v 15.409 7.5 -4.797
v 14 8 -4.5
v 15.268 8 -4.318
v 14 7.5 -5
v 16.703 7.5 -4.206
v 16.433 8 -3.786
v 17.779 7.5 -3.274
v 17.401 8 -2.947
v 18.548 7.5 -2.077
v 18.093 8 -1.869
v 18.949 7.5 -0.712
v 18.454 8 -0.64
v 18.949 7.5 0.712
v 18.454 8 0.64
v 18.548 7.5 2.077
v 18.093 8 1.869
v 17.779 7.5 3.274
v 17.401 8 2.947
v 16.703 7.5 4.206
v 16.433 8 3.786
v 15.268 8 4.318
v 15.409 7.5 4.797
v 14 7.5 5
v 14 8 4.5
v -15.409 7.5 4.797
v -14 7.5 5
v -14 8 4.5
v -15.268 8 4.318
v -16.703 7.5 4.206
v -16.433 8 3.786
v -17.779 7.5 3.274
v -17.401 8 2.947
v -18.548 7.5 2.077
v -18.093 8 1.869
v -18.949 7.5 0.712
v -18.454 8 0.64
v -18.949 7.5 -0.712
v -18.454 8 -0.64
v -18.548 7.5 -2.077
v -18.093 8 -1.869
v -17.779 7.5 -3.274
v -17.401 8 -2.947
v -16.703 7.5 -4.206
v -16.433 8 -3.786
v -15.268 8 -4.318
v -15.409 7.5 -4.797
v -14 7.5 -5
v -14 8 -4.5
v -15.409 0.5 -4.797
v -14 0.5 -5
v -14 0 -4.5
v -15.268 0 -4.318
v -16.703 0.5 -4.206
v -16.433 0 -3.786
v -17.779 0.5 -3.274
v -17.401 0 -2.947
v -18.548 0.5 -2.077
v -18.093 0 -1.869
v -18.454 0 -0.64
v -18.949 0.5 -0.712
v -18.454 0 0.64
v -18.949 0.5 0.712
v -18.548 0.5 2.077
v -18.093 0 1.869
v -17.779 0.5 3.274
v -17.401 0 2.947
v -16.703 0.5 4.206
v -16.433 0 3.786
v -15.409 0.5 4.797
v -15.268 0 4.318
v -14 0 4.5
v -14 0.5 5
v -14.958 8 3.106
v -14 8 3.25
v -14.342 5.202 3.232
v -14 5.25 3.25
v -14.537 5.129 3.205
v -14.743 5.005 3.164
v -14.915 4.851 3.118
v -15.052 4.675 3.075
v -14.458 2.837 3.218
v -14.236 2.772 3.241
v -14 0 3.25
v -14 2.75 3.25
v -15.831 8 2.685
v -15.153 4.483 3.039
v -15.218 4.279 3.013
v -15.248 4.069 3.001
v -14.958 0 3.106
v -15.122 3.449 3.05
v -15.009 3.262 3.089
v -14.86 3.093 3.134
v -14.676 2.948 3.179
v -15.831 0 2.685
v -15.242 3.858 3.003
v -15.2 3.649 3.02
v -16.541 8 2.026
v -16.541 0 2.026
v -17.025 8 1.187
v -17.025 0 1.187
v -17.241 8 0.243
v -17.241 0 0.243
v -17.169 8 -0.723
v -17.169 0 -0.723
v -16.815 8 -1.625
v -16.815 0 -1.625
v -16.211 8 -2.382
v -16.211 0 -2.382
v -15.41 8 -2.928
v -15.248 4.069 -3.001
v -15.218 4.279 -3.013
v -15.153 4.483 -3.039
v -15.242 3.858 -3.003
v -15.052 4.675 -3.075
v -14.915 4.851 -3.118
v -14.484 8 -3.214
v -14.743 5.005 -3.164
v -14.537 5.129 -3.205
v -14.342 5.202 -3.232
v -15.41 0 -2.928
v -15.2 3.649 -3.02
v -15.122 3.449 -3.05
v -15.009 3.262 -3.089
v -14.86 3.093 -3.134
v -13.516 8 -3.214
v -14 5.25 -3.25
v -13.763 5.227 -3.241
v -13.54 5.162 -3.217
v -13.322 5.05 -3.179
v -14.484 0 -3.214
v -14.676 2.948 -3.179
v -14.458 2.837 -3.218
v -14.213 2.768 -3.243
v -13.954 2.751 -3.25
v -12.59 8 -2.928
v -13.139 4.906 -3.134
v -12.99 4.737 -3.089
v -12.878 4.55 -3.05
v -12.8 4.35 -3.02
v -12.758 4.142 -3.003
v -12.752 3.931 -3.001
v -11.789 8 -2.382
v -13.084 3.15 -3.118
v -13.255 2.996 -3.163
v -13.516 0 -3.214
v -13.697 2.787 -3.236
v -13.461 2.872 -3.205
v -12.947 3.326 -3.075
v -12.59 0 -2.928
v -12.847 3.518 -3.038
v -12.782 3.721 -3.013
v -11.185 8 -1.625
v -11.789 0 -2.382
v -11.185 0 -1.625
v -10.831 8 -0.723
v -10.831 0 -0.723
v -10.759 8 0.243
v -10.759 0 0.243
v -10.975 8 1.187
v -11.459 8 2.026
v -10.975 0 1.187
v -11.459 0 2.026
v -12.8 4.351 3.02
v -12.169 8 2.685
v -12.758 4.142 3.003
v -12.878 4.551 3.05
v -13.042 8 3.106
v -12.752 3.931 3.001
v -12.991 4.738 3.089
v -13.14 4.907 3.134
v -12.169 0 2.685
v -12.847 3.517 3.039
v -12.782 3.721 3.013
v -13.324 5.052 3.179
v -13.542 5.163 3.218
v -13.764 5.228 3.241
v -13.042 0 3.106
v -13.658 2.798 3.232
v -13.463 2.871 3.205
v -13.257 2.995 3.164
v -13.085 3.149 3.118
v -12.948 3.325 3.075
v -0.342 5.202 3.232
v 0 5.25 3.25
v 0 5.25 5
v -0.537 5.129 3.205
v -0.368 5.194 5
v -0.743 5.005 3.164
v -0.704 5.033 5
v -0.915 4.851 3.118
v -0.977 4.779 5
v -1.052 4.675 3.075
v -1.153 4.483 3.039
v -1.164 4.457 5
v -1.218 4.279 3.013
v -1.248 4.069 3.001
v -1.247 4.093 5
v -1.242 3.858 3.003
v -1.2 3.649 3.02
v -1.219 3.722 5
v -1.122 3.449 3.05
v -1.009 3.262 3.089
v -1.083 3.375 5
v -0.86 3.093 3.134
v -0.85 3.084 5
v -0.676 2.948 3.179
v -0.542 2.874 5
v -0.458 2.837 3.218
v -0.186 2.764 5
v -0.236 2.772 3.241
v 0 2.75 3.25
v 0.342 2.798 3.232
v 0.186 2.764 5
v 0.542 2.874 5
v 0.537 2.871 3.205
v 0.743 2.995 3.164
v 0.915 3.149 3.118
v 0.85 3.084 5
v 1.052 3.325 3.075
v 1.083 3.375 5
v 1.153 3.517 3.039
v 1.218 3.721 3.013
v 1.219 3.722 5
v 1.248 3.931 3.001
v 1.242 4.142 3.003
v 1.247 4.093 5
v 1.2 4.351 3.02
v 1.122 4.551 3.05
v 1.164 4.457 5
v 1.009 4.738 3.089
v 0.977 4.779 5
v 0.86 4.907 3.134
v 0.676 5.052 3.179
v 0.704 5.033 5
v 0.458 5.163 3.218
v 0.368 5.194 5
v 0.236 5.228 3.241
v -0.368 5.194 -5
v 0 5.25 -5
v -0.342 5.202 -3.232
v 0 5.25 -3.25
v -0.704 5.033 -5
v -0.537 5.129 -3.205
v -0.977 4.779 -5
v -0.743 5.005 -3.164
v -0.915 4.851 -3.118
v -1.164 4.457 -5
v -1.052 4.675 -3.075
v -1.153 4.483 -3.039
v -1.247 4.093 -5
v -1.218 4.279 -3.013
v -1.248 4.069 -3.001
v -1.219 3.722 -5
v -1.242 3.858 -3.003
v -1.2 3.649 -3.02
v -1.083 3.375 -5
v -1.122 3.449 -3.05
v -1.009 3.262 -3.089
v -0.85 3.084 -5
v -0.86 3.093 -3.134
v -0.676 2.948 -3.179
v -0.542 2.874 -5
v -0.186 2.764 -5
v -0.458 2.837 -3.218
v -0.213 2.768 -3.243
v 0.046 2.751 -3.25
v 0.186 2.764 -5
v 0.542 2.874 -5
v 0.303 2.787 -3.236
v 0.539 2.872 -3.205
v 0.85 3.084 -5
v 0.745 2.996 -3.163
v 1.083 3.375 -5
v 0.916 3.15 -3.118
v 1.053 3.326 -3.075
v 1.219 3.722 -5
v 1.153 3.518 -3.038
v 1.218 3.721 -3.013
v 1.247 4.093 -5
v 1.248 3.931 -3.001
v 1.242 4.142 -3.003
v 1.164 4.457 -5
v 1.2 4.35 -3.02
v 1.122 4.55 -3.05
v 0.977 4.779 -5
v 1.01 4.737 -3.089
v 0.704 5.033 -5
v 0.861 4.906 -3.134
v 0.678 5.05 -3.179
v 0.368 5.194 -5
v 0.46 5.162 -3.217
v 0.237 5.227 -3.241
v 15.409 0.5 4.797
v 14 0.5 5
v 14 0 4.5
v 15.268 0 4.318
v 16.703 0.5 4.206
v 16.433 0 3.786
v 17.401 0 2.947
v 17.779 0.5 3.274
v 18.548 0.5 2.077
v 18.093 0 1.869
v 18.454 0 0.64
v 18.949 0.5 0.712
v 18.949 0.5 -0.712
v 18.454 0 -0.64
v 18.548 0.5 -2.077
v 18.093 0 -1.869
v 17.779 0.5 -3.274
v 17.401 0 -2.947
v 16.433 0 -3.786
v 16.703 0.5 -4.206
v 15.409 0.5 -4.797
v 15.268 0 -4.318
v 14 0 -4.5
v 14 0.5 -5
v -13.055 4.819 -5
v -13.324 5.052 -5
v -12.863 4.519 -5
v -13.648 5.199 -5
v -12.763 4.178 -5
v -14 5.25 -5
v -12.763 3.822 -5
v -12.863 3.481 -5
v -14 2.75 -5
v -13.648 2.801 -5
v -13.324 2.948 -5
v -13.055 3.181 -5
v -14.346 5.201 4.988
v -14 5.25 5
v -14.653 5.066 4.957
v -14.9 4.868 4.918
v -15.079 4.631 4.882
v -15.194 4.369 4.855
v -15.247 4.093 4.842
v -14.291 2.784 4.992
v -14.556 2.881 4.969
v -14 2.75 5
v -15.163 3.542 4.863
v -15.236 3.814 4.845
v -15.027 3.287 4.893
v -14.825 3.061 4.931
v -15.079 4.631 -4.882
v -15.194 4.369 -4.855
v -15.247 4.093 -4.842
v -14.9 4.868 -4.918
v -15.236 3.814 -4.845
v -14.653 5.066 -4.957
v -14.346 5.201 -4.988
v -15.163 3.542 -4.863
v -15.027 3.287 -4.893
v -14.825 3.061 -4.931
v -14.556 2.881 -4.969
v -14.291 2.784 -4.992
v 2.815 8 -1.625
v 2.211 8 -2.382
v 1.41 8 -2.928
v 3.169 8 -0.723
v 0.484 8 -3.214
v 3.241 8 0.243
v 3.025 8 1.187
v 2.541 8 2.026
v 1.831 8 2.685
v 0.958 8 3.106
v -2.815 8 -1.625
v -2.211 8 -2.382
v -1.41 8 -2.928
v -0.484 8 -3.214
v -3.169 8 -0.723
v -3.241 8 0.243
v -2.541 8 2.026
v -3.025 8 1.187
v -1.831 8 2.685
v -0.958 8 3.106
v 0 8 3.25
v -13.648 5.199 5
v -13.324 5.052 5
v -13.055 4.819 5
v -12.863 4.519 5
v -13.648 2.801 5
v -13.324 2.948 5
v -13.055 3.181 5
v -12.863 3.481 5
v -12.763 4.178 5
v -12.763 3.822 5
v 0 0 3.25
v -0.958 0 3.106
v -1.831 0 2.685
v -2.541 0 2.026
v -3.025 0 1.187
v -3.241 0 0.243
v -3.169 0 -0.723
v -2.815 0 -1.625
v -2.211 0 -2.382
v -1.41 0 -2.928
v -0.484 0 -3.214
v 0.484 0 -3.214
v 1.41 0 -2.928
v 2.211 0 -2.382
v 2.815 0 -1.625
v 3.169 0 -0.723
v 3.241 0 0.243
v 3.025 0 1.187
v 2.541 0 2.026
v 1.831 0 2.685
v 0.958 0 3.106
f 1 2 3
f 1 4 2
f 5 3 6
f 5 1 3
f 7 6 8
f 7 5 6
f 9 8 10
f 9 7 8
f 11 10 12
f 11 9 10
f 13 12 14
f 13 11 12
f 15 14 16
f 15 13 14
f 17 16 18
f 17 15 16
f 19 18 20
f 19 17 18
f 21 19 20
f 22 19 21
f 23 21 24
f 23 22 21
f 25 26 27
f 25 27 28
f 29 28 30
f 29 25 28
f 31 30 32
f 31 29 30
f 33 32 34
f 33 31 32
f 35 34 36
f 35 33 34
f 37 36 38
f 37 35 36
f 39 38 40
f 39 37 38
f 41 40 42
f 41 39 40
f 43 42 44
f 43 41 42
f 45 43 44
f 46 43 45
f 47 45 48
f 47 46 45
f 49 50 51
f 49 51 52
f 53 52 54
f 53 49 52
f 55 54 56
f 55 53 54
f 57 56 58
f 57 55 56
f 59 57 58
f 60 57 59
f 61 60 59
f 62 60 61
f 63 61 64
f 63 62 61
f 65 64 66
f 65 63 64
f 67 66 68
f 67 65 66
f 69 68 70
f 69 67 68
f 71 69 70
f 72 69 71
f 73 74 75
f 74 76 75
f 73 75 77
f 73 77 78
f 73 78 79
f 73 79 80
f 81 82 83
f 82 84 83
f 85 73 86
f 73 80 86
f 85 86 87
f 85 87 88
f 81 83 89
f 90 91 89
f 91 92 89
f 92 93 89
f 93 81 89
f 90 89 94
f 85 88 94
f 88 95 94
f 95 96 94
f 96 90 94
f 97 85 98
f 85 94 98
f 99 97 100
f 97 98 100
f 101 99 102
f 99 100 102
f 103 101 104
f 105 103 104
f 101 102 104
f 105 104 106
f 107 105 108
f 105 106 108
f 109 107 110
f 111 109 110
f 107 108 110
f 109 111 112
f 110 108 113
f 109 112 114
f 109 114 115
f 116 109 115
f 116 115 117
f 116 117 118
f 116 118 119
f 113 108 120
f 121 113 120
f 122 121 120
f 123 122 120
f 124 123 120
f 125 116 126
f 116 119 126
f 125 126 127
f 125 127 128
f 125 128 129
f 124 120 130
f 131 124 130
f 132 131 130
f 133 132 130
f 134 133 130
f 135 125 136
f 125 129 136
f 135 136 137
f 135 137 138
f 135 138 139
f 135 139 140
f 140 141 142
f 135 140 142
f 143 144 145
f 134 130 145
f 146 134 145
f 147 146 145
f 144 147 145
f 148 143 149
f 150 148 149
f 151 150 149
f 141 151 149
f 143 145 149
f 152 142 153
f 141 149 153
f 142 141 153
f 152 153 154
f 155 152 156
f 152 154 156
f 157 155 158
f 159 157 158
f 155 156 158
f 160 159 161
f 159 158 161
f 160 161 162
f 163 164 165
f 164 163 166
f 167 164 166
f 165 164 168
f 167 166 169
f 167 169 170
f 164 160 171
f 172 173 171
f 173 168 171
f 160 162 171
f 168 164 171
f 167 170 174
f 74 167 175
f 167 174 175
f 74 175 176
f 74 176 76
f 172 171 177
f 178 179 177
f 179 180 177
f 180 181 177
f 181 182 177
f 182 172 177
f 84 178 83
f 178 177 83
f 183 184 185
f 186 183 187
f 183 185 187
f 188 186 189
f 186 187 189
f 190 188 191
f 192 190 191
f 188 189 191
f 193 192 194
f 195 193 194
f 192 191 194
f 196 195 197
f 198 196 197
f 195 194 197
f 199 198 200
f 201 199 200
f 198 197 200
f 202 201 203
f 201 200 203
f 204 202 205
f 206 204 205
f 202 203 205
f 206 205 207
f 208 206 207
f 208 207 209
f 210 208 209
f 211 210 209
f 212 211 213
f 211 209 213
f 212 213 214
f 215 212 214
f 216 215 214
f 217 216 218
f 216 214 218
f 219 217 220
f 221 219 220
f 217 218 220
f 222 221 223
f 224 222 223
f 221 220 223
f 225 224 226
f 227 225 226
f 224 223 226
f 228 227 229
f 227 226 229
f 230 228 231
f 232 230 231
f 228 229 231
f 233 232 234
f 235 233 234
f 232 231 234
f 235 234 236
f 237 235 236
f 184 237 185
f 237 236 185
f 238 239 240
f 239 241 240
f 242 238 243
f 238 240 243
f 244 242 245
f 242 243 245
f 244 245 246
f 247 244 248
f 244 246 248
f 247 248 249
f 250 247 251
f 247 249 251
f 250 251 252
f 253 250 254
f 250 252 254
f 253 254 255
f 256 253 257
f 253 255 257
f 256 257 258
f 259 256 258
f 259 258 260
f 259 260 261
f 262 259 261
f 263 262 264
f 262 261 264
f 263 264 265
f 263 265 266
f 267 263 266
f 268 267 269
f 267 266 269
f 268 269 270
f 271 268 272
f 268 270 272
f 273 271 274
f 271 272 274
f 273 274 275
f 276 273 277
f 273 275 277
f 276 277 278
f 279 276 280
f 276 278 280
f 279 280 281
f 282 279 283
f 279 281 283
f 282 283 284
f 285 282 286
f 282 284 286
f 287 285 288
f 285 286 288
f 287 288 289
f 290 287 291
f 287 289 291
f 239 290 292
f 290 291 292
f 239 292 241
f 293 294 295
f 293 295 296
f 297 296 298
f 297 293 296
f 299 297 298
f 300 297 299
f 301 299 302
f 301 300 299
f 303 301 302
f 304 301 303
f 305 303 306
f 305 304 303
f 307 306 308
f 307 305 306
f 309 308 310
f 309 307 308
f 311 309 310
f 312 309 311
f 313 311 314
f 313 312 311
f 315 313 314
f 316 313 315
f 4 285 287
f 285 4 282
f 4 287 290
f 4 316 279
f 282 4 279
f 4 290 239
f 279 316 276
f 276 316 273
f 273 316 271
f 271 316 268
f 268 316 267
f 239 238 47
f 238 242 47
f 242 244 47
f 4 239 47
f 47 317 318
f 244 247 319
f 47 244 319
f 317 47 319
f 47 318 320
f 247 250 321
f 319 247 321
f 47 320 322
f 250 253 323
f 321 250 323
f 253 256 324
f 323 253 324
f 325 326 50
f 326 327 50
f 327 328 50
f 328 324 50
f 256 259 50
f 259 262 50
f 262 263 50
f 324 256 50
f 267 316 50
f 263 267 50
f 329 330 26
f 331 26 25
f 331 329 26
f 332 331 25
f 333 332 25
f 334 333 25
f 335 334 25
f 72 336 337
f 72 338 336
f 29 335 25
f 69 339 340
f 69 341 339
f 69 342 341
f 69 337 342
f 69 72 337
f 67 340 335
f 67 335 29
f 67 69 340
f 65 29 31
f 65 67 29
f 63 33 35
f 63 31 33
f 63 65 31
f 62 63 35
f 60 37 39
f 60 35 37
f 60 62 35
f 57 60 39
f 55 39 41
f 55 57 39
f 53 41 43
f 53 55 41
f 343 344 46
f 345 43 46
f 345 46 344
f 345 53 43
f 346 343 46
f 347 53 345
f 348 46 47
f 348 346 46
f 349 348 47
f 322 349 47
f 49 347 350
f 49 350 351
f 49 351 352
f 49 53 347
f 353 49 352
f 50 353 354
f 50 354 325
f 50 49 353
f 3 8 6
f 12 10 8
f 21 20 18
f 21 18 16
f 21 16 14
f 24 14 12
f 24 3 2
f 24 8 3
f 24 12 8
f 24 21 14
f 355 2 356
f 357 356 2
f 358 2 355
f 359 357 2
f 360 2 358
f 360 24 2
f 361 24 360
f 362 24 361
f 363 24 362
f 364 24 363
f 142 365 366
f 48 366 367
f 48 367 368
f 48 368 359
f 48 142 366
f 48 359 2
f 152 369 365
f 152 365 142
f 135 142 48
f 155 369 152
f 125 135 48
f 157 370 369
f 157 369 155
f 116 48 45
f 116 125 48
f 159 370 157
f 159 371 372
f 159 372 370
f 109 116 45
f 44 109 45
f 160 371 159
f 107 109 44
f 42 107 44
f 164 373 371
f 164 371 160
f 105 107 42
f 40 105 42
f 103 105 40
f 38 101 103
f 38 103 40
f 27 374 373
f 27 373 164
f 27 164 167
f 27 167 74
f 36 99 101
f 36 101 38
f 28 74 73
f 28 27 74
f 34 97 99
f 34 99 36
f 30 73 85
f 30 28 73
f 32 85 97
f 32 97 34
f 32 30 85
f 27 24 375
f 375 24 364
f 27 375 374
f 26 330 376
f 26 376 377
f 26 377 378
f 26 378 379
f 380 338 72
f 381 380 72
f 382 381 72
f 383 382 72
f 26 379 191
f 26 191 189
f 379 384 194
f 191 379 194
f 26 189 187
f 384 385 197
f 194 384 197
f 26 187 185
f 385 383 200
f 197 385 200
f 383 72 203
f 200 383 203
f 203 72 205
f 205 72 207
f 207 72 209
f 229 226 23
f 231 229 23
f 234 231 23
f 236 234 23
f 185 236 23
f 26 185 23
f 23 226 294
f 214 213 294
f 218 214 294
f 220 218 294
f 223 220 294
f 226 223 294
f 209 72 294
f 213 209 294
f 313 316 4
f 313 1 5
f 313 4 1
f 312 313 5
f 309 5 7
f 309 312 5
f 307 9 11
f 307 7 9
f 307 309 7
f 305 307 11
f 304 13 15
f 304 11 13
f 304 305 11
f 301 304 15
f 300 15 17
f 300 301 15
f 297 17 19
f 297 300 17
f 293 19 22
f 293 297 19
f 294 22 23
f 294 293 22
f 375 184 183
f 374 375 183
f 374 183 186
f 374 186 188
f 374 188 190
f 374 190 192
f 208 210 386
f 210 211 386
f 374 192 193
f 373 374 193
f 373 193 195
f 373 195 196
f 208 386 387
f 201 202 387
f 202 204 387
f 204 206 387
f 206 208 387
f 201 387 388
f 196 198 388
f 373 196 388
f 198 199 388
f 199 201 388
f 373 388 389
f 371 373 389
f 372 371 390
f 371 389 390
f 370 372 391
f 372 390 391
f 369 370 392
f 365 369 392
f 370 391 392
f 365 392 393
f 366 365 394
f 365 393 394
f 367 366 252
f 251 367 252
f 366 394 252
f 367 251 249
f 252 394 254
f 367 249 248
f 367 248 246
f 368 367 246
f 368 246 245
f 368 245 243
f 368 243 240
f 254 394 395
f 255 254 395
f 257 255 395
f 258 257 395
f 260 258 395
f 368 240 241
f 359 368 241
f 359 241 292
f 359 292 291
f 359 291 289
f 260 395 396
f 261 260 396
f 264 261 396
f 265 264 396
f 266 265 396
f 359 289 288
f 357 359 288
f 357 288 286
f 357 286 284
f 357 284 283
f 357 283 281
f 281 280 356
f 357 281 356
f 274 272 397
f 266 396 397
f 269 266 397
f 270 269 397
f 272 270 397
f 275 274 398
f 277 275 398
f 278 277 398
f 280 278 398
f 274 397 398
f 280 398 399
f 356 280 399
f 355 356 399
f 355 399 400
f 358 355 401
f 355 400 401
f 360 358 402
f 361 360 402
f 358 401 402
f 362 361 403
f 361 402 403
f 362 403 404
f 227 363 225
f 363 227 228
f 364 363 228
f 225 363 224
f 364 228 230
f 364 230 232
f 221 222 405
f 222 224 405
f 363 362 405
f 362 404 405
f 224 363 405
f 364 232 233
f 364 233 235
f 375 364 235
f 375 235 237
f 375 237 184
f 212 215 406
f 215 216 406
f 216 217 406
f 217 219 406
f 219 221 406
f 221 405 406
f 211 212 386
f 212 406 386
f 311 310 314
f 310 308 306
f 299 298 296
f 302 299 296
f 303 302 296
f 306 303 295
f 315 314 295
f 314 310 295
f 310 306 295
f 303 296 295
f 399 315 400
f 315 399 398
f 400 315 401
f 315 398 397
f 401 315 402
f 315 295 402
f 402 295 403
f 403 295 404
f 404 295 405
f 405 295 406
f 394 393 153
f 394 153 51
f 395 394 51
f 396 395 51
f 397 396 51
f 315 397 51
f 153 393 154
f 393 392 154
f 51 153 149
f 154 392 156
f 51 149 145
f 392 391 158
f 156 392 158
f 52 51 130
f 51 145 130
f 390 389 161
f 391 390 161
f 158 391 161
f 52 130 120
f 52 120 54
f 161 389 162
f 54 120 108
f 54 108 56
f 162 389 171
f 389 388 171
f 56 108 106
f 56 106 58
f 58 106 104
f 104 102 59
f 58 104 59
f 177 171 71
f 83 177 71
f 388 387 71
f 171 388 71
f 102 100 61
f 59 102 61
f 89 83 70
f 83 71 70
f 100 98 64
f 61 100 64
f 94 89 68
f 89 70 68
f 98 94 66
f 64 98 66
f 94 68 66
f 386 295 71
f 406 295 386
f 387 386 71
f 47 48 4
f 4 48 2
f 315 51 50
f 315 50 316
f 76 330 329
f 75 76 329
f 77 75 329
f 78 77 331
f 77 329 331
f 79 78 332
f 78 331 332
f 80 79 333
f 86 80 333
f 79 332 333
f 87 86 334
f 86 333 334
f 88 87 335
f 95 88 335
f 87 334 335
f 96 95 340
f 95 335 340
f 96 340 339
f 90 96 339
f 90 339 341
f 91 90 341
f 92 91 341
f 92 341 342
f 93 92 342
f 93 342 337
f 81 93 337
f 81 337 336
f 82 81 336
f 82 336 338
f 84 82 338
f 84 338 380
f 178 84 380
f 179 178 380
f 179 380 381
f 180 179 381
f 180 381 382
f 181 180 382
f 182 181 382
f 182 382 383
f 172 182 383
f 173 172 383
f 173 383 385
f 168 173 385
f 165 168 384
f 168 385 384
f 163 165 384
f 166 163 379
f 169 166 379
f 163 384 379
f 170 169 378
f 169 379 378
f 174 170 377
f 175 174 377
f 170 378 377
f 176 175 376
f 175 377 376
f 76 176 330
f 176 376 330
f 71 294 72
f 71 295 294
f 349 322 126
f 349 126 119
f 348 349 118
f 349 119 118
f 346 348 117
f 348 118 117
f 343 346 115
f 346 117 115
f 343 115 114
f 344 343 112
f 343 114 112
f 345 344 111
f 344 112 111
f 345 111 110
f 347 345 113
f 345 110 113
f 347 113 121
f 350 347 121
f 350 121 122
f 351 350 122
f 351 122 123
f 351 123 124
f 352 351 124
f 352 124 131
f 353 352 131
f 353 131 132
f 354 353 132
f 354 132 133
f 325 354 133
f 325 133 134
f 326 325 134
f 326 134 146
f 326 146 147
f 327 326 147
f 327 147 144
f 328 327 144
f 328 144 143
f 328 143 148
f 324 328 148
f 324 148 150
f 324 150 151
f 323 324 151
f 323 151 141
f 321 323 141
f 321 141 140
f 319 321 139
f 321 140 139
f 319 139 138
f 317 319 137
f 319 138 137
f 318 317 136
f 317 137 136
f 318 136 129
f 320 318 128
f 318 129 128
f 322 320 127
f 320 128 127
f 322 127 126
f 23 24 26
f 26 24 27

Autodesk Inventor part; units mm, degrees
ref_plane "YZ Plane" through (0, 0, 0) normal (1, 0, 0) x (0, 1, 0)
ref_plane "XZ Plane" through (0, 0, 0) normal (0, 1, 0) x (-1, 0, 0)
ref_plane "XY Plane" through (0, 0, 0) normal (0, 0, 1) x (1, 0, 0)
sketch "Skizze1" plane through (0, 0, 0) normal (0, 1, 0) x (-1, 0, 0)
  line L0 (14, 5) -> (-14, 5)
  arc A0 (-14, 5) -> (-14, -5) centre (-14, 0) ccw
  line L1 (-14, -5) -> (14, -5)
  arc A1 (14, -5) -> (14, 5) centre (14, 0) ccw
  line L2 (19, 0) -> (-19, 0) construction
  point P0 (0, 0)
  point P1 (0, 0)
  dimension "d0" = 10
  dimension "d1" = 38
extrude "Extrusion1" add sketch "Skizze1" along normal blind 8
sketch "Skizze3" plane through (0, 8, 0) normal (0, 1, 0) x (1, 0, 0)
  arc A0 (14, -5) -> (14, 5) centre (14, 0) ccw projected
  point P0 (0, 0)
  point P1 (0, 0)
hole "Bohrung2" at (0, 8, 0) direction (0, -1, 0) diameter 6.5 depth 8
chamfer "Fasen1" distance 0.5 angle 45 8 edges at (0, 8, -5) (-19, 8, 0) (0, 8, 5) (19, 8, 0) (0, 0, -5) (-19, 0, 0) (0, 0, 5) (19, 0, 0)
sketch "Skizze2" plane through (0, 8, 0) normal (0, 1, 0) x (1, 0, 0)
  arc A0 (-14, 5) -> (-14, -5) centre (-14, 0) ccw projected
  point P0 (0, 0)
  point P1 (-14, 0)
hole "Bohrung1" at (-14, 8, 0) direction (0, -1, 0) diameter 6.5 depth 8
sketch "Skizze4" plane through (14, 0, -5) normal (0, 0, -1) x (-1, 0, 0)
  line L0 (0, 8) -> (28, 8) projected
  line L1 (0, 0) -> (28, 0) projected
  line L2 (33, 0) -> (33, 8) projected
  line L3 (24.75, 8) -> (31.25, 8) projected
  line L4 (28, 0) -> (28, 8) projected
  point P0 (14, 0)
  point P1 (28, 4)
  point P2 (14, 4)
  point P3 (14, 0)
  point P4 (28, 4)
  dimension "d25" = 4
hole "Bohrung3" at (-14, 4, -5) at (0, 4, -5) direction (0, 0, 1) diameter 2.5 depth 10
properties part number "BMS_support" material "Gummi, Silikon"
